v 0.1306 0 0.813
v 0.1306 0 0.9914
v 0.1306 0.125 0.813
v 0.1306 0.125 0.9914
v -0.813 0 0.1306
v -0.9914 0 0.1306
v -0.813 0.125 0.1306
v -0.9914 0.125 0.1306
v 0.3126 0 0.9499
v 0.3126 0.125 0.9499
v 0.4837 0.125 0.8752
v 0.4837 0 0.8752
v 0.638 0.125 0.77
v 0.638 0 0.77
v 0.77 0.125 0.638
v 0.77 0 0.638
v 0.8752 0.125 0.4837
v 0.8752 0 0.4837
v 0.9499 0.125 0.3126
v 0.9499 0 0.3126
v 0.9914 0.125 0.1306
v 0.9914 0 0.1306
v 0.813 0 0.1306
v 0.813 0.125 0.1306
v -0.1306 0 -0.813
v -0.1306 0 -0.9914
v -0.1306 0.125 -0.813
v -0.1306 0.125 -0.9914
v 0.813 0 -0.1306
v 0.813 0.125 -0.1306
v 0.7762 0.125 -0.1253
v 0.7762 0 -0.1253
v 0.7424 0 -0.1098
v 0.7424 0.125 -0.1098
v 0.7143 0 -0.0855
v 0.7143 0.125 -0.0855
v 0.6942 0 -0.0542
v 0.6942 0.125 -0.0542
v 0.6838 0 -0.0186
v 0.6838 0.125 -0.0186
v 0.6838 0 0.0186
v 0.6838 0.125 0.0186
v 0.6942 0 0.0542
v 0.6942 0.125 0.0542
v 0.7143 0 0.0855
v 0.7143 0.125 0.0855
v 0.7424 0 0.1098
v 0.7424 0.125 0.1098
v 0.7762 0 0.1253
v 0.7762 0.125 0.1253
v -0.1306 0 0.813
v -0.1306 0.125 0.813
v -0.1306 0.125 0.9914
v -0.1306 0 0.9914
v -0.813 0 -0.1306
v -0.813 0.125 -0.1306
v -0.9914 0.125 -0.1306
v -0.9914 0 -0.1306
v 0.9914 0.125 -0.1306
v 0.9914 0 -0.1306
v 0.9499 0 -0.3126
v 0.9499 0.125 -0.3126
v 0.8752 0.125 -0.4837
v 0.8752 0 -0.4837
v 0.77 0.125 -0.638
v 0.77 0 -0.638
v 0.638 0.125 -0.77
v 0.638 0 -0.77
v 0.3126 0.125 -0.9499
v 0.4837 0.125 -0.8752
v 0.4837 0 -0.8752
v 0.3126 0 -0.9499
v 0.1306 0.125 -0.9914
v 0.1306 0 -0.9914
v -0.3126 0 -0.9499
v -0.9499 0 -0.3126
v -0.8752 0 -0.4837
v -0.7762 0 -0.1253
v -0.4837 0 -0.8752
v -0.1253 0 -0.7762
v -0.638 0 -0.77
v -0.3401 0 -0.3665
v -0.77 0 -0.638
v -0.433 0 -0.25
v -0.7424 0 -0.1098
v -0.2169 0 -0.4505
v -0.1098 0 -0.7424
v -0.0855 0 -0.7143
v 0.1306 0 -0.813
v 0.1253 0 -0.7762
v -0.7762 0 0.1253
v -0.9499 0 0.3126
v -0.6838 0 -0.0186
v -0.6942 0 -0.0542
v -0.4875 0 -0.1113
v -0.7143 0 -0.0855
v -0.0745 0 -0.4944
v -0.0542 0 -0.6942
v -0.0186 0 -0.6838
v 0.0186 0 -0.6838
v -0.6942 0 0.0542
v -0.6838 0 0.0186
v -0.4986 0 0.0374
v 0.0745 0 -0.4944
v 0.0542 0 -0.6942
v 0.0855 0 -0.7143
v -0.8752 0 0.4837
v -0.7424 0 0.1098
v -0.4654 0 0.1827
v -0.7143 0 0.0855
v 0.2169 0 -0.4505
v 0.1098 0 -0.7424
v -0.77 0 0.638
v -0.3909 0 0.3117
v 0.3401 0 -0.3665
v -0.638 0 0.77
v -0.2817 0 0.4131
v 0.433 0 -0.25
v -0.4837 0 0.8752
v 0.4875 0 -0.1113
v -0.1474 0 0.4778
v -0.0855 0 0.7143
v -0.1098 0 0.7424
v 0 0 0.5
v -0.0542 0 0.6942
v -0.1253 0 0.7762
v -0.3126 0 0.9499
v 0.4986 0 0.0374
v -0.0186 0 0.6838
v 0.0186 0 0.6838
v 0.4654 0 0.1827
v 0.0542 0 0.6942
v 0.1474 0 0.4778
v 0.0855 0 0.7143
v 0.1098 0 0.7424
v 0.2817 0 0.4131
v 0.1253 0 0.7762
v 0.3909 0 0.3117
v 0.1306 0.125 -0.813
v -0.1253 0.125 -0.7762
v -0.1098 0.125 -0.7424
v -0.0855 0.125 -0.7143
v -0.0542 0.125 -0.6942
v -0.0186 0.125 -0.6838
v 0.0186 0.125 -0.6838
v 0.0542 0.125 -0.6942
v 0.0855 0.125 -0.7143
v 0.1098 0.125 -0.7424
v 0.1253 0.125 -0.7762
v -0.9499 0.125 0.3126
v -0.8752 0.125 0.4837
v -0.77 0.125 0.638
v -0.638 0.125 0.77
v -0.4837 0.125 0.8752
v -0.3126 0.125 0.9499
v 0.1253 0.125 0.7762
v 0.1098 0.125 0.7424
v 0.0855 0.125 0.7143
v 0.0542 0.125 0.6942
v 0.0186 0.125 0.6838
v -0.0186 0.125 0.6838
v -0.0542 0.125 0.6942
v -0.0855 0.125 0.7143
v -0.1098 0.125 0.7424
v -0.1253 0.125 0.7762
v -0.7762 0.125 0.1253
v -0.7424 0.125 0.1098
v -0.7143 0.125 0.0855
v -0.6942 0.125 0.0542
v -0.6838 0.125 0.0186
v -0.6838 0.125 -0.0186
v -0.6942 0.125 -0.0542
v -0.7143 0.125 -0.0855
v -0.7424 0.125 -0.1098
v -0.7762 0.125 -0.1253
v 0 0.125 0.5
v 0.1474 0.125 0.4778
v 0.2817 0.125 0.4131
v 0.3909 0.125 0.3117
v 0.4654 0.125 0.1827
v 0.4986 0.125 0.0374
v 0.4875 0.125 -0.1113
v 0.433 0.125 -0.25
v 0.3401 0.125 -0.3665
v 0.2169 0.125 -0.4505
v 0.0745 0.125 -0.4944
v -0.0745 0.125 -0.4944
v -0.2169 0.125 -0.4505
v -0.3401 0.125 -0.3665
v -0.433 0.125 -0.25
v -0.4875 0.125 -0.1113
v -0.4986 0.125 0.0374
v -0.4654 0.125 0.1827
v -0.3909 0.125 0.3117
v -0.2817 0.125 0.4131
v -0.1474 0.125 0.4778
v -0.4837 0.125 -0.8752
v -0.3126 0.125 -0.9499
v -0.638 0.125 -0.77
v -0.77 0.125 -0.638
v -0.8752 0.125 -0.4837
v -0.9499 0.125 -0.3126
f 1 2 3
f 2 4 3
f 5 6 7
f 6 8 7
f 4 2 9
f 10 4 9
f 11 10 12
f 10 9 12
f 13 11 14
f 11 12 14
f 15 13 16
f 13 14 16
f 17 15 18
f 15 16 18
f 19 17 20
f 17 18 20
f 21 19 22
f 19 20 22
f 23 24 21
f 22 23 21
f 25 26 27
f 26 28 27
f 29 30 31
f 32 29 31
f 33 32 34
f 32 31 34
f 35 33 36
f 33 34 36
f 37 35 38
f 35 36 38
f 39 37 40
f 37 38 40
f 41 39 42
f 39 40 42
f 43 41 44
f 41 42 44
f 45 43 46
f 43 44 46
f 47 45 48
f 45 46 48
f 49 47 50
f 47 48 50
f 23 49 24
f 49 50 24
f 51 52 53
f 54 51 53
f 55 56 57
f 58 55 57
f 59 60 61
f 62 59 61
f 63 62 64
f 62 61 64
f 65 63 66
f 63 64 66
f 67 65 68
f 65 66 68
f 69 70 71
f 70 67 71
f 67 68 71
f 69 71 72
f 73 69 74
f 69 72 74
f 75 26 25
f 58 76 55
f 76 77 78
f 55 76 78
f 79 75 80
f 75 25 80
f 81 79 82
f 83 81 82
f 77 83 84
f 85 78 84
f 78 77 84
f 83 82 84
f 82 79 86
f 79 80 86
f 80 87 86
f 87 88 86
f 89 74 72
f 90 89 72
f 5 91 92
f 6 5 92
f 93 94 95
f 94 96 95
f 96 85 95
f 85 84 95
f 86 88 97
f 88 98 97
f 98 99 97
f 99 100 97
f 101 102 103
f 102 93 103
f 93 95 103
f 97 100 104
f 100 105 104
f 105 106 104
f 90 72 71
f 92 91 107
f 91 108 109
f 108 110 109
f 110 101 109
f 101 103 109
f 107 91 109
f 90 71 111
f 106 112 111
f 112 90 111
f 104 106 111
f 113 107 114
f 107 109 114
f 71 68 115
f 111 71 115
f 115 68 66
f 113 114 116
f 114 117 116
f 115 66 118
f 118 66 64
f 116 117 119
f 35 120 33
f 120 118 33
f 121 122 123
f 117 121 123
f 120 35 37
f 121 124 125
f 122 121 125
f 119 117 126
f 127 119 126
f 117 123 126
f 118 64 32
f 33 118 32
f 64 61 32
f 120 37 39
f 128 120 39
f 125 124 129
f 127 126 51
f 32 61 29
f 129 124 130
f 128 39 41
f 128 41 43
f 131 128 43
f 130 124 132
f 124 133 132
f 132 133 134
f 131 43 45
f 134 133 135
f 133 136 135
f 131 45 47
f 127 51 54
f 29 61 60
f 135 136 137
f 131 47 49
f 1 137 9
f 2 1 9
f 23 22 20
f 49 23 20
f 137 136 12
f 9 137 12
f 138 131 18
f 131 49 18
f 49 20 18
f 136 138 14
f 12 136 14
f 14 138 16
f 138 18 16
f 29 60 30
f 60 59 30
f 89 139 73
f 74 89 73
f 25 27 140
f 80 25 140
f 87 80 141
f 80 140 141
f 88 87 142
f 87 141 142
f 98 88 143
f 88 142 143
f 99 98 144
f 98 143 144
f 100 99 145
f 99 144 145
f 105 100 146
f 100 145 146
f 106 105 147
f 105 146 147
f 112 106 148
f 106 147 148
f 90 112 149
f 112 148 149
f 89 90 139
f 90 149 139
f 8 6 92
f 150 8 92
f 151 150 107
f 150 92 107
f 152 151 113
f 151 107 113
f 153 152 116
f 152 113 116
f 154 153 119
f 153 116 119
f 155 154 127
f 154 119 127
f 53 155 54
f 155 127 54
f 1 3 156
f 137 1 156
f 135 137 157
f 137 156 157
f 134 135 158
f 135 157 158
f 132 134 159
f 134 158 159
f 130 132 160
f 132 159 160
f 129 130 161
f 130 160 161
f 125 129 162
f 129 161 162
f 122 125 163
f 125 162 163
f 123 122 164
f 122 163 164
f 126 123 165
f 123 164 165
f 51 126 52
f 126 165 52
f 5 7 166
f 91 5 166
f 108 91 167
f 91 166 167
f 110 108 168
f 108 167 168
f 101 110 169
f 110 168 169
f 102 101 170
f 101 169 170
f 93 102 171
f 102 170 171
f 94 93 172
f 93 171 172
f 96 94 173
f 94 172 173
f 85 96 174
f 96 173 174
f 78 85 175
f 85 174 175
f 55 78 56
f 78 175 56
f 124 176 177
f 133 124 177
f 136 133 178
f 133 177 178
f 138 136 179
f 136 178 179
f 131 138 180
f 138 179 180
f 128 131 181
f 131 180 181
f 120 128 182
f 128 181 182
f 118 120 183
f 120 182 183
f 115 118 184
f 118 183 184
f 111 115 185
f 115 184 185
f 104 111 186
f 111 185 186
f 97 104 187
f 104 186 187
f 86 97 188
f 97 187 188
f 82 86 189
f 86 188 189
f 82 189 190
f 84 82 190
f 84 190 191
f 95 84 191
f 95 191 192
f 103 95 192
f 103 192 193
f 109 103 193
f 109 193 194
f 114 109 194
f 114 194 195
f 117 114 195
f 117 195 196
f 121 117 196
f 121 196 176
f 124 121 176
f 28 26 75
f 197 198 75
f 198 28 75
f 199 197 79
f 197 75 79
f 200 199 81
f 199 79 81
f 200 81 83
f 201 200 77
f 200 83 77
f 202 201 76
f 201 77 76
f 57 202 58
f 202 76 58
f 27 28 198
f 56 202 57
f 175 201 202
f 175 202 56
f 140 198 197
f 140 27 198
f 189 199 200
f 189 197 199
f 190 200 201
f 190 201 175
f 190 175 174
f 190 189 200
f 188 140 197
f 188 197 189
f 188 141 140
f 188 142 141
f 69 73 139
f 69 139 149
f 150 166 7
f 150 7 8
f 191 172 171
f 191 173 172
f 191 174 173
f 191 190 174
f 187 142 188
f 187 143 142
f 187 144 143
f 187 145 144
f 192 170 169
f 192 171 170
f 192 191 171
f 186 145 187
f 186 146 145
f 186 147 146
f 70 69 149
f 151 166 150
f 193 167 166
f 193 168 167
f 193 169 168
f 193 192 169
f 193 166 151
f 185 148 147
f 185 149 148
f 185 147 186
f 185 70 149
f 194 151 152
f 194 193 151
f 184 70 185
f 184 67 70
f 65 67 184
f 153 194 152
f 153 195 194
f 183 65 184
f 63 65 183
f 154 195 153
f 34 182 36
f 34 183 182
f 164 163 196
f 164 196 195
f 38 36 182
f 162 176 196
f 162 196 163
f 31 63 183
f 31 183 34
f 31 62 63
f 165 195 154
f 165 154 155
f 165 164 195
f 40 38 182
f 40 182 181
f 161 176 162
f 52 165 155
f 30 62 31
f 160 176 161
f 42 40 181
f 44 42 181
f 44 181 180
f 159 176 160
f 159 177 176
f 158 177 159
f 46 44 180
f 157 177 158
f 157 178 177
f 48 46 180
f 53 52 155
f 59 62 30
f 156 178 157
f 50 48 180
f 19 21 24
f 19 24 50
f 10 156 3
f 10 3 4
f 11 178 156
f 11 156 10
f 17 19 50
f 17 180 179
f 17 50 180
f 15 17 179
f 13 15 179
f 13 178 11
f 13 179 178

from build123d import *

# Parameters (mm, degrees)
SKETCH1_R           = 1
BOSS_EXTRUDE2_DEPTH = 0.125
CUT_EXTRUDE1_DEPTH  = 2.419727086
CIRPATTERN1_COUNT   = 4
SKETCH4_R           = 0.5
CUT_EXTRUDE2_DEPTH  = 2.40767025


with BuildPart() as part:
    # Sketch1 → Boss-Extrude2 (new body)
    with BuildSketch(Plane(origin=(0, 0, 0), x_dir=(1, 0, 0), z_dir=(0, 1, 0))):
        with Locations(Location((0, 0, 0), (0, 0, 270))):
            Circle(SKETCH1_R)
    extrude(amount=BOSS_EXTRUDE2_DEPTH)

    # Sketch3 → Cut-Extrude1 (cut, symmetric)
    with BuildSketch(Plane(origin=(0, 0.125, 0), x_dir=(1, 0, 0), z_dir=(0, 1, 0))):
        with BuildLine():
            Line((-0.130555483, 15.571394269), (-0.130555483, 0.991441005))
            Line((-0.130555483, 0.991441005), (-0.130555483, 0.813))
            ThreePointArc((-0.130555483, 0.813), (0, 0.682444517), (0.130555483, 0.813))
            Line((0.130555483, 0.813), (0.130555483, 0.991441005))
            Line((0.130555483, 0.991441005), (0.130555483, 15.571394269))
            Line((0.130555483, 15.571394269), (0.130555483, 44.731300798))
            Line((0.130555483, 44.731300798), (-0.130555483, 44.731300798))
            Line((-0.130555483, 44.731300798), (-0.130555483, 15.571394269))
        make_face()
    cut_extrude1 = extrude(amount=CUT_EXTRUDE1_DEPTH, both=True, mode=Mode.SUBTRACT)

    # CirPattern1: Cut-Extrude1 ×4 about axis
    cirpattern1_axis = Axis((0, 0, 0), (0, 1, 0))
    for i in range(1, CIRPATTERN1_COUNT):
        add(cut_extrude1.rotate(cirpattern1_axis, i * 360 / CIRPATTERN1_COUNT), mode=Mode.SUBTRACT)

    # Sketch4 → Cut-Extrude2 (cut, through all)
    with BuildSketch(Plane(origin=(0, 0.125, 0), x_dir=(1, 0, 0), z_dir=(0, 1, 0))):
        with Locations(Location((0, 0, 0), (0, 0, 270))):
            Circle(SKETCH4_R)
    extrude(amount=-CUT_EXTRUDE2_DEPTH, mode=Mode.SUBTRACT)


solid = part.part
